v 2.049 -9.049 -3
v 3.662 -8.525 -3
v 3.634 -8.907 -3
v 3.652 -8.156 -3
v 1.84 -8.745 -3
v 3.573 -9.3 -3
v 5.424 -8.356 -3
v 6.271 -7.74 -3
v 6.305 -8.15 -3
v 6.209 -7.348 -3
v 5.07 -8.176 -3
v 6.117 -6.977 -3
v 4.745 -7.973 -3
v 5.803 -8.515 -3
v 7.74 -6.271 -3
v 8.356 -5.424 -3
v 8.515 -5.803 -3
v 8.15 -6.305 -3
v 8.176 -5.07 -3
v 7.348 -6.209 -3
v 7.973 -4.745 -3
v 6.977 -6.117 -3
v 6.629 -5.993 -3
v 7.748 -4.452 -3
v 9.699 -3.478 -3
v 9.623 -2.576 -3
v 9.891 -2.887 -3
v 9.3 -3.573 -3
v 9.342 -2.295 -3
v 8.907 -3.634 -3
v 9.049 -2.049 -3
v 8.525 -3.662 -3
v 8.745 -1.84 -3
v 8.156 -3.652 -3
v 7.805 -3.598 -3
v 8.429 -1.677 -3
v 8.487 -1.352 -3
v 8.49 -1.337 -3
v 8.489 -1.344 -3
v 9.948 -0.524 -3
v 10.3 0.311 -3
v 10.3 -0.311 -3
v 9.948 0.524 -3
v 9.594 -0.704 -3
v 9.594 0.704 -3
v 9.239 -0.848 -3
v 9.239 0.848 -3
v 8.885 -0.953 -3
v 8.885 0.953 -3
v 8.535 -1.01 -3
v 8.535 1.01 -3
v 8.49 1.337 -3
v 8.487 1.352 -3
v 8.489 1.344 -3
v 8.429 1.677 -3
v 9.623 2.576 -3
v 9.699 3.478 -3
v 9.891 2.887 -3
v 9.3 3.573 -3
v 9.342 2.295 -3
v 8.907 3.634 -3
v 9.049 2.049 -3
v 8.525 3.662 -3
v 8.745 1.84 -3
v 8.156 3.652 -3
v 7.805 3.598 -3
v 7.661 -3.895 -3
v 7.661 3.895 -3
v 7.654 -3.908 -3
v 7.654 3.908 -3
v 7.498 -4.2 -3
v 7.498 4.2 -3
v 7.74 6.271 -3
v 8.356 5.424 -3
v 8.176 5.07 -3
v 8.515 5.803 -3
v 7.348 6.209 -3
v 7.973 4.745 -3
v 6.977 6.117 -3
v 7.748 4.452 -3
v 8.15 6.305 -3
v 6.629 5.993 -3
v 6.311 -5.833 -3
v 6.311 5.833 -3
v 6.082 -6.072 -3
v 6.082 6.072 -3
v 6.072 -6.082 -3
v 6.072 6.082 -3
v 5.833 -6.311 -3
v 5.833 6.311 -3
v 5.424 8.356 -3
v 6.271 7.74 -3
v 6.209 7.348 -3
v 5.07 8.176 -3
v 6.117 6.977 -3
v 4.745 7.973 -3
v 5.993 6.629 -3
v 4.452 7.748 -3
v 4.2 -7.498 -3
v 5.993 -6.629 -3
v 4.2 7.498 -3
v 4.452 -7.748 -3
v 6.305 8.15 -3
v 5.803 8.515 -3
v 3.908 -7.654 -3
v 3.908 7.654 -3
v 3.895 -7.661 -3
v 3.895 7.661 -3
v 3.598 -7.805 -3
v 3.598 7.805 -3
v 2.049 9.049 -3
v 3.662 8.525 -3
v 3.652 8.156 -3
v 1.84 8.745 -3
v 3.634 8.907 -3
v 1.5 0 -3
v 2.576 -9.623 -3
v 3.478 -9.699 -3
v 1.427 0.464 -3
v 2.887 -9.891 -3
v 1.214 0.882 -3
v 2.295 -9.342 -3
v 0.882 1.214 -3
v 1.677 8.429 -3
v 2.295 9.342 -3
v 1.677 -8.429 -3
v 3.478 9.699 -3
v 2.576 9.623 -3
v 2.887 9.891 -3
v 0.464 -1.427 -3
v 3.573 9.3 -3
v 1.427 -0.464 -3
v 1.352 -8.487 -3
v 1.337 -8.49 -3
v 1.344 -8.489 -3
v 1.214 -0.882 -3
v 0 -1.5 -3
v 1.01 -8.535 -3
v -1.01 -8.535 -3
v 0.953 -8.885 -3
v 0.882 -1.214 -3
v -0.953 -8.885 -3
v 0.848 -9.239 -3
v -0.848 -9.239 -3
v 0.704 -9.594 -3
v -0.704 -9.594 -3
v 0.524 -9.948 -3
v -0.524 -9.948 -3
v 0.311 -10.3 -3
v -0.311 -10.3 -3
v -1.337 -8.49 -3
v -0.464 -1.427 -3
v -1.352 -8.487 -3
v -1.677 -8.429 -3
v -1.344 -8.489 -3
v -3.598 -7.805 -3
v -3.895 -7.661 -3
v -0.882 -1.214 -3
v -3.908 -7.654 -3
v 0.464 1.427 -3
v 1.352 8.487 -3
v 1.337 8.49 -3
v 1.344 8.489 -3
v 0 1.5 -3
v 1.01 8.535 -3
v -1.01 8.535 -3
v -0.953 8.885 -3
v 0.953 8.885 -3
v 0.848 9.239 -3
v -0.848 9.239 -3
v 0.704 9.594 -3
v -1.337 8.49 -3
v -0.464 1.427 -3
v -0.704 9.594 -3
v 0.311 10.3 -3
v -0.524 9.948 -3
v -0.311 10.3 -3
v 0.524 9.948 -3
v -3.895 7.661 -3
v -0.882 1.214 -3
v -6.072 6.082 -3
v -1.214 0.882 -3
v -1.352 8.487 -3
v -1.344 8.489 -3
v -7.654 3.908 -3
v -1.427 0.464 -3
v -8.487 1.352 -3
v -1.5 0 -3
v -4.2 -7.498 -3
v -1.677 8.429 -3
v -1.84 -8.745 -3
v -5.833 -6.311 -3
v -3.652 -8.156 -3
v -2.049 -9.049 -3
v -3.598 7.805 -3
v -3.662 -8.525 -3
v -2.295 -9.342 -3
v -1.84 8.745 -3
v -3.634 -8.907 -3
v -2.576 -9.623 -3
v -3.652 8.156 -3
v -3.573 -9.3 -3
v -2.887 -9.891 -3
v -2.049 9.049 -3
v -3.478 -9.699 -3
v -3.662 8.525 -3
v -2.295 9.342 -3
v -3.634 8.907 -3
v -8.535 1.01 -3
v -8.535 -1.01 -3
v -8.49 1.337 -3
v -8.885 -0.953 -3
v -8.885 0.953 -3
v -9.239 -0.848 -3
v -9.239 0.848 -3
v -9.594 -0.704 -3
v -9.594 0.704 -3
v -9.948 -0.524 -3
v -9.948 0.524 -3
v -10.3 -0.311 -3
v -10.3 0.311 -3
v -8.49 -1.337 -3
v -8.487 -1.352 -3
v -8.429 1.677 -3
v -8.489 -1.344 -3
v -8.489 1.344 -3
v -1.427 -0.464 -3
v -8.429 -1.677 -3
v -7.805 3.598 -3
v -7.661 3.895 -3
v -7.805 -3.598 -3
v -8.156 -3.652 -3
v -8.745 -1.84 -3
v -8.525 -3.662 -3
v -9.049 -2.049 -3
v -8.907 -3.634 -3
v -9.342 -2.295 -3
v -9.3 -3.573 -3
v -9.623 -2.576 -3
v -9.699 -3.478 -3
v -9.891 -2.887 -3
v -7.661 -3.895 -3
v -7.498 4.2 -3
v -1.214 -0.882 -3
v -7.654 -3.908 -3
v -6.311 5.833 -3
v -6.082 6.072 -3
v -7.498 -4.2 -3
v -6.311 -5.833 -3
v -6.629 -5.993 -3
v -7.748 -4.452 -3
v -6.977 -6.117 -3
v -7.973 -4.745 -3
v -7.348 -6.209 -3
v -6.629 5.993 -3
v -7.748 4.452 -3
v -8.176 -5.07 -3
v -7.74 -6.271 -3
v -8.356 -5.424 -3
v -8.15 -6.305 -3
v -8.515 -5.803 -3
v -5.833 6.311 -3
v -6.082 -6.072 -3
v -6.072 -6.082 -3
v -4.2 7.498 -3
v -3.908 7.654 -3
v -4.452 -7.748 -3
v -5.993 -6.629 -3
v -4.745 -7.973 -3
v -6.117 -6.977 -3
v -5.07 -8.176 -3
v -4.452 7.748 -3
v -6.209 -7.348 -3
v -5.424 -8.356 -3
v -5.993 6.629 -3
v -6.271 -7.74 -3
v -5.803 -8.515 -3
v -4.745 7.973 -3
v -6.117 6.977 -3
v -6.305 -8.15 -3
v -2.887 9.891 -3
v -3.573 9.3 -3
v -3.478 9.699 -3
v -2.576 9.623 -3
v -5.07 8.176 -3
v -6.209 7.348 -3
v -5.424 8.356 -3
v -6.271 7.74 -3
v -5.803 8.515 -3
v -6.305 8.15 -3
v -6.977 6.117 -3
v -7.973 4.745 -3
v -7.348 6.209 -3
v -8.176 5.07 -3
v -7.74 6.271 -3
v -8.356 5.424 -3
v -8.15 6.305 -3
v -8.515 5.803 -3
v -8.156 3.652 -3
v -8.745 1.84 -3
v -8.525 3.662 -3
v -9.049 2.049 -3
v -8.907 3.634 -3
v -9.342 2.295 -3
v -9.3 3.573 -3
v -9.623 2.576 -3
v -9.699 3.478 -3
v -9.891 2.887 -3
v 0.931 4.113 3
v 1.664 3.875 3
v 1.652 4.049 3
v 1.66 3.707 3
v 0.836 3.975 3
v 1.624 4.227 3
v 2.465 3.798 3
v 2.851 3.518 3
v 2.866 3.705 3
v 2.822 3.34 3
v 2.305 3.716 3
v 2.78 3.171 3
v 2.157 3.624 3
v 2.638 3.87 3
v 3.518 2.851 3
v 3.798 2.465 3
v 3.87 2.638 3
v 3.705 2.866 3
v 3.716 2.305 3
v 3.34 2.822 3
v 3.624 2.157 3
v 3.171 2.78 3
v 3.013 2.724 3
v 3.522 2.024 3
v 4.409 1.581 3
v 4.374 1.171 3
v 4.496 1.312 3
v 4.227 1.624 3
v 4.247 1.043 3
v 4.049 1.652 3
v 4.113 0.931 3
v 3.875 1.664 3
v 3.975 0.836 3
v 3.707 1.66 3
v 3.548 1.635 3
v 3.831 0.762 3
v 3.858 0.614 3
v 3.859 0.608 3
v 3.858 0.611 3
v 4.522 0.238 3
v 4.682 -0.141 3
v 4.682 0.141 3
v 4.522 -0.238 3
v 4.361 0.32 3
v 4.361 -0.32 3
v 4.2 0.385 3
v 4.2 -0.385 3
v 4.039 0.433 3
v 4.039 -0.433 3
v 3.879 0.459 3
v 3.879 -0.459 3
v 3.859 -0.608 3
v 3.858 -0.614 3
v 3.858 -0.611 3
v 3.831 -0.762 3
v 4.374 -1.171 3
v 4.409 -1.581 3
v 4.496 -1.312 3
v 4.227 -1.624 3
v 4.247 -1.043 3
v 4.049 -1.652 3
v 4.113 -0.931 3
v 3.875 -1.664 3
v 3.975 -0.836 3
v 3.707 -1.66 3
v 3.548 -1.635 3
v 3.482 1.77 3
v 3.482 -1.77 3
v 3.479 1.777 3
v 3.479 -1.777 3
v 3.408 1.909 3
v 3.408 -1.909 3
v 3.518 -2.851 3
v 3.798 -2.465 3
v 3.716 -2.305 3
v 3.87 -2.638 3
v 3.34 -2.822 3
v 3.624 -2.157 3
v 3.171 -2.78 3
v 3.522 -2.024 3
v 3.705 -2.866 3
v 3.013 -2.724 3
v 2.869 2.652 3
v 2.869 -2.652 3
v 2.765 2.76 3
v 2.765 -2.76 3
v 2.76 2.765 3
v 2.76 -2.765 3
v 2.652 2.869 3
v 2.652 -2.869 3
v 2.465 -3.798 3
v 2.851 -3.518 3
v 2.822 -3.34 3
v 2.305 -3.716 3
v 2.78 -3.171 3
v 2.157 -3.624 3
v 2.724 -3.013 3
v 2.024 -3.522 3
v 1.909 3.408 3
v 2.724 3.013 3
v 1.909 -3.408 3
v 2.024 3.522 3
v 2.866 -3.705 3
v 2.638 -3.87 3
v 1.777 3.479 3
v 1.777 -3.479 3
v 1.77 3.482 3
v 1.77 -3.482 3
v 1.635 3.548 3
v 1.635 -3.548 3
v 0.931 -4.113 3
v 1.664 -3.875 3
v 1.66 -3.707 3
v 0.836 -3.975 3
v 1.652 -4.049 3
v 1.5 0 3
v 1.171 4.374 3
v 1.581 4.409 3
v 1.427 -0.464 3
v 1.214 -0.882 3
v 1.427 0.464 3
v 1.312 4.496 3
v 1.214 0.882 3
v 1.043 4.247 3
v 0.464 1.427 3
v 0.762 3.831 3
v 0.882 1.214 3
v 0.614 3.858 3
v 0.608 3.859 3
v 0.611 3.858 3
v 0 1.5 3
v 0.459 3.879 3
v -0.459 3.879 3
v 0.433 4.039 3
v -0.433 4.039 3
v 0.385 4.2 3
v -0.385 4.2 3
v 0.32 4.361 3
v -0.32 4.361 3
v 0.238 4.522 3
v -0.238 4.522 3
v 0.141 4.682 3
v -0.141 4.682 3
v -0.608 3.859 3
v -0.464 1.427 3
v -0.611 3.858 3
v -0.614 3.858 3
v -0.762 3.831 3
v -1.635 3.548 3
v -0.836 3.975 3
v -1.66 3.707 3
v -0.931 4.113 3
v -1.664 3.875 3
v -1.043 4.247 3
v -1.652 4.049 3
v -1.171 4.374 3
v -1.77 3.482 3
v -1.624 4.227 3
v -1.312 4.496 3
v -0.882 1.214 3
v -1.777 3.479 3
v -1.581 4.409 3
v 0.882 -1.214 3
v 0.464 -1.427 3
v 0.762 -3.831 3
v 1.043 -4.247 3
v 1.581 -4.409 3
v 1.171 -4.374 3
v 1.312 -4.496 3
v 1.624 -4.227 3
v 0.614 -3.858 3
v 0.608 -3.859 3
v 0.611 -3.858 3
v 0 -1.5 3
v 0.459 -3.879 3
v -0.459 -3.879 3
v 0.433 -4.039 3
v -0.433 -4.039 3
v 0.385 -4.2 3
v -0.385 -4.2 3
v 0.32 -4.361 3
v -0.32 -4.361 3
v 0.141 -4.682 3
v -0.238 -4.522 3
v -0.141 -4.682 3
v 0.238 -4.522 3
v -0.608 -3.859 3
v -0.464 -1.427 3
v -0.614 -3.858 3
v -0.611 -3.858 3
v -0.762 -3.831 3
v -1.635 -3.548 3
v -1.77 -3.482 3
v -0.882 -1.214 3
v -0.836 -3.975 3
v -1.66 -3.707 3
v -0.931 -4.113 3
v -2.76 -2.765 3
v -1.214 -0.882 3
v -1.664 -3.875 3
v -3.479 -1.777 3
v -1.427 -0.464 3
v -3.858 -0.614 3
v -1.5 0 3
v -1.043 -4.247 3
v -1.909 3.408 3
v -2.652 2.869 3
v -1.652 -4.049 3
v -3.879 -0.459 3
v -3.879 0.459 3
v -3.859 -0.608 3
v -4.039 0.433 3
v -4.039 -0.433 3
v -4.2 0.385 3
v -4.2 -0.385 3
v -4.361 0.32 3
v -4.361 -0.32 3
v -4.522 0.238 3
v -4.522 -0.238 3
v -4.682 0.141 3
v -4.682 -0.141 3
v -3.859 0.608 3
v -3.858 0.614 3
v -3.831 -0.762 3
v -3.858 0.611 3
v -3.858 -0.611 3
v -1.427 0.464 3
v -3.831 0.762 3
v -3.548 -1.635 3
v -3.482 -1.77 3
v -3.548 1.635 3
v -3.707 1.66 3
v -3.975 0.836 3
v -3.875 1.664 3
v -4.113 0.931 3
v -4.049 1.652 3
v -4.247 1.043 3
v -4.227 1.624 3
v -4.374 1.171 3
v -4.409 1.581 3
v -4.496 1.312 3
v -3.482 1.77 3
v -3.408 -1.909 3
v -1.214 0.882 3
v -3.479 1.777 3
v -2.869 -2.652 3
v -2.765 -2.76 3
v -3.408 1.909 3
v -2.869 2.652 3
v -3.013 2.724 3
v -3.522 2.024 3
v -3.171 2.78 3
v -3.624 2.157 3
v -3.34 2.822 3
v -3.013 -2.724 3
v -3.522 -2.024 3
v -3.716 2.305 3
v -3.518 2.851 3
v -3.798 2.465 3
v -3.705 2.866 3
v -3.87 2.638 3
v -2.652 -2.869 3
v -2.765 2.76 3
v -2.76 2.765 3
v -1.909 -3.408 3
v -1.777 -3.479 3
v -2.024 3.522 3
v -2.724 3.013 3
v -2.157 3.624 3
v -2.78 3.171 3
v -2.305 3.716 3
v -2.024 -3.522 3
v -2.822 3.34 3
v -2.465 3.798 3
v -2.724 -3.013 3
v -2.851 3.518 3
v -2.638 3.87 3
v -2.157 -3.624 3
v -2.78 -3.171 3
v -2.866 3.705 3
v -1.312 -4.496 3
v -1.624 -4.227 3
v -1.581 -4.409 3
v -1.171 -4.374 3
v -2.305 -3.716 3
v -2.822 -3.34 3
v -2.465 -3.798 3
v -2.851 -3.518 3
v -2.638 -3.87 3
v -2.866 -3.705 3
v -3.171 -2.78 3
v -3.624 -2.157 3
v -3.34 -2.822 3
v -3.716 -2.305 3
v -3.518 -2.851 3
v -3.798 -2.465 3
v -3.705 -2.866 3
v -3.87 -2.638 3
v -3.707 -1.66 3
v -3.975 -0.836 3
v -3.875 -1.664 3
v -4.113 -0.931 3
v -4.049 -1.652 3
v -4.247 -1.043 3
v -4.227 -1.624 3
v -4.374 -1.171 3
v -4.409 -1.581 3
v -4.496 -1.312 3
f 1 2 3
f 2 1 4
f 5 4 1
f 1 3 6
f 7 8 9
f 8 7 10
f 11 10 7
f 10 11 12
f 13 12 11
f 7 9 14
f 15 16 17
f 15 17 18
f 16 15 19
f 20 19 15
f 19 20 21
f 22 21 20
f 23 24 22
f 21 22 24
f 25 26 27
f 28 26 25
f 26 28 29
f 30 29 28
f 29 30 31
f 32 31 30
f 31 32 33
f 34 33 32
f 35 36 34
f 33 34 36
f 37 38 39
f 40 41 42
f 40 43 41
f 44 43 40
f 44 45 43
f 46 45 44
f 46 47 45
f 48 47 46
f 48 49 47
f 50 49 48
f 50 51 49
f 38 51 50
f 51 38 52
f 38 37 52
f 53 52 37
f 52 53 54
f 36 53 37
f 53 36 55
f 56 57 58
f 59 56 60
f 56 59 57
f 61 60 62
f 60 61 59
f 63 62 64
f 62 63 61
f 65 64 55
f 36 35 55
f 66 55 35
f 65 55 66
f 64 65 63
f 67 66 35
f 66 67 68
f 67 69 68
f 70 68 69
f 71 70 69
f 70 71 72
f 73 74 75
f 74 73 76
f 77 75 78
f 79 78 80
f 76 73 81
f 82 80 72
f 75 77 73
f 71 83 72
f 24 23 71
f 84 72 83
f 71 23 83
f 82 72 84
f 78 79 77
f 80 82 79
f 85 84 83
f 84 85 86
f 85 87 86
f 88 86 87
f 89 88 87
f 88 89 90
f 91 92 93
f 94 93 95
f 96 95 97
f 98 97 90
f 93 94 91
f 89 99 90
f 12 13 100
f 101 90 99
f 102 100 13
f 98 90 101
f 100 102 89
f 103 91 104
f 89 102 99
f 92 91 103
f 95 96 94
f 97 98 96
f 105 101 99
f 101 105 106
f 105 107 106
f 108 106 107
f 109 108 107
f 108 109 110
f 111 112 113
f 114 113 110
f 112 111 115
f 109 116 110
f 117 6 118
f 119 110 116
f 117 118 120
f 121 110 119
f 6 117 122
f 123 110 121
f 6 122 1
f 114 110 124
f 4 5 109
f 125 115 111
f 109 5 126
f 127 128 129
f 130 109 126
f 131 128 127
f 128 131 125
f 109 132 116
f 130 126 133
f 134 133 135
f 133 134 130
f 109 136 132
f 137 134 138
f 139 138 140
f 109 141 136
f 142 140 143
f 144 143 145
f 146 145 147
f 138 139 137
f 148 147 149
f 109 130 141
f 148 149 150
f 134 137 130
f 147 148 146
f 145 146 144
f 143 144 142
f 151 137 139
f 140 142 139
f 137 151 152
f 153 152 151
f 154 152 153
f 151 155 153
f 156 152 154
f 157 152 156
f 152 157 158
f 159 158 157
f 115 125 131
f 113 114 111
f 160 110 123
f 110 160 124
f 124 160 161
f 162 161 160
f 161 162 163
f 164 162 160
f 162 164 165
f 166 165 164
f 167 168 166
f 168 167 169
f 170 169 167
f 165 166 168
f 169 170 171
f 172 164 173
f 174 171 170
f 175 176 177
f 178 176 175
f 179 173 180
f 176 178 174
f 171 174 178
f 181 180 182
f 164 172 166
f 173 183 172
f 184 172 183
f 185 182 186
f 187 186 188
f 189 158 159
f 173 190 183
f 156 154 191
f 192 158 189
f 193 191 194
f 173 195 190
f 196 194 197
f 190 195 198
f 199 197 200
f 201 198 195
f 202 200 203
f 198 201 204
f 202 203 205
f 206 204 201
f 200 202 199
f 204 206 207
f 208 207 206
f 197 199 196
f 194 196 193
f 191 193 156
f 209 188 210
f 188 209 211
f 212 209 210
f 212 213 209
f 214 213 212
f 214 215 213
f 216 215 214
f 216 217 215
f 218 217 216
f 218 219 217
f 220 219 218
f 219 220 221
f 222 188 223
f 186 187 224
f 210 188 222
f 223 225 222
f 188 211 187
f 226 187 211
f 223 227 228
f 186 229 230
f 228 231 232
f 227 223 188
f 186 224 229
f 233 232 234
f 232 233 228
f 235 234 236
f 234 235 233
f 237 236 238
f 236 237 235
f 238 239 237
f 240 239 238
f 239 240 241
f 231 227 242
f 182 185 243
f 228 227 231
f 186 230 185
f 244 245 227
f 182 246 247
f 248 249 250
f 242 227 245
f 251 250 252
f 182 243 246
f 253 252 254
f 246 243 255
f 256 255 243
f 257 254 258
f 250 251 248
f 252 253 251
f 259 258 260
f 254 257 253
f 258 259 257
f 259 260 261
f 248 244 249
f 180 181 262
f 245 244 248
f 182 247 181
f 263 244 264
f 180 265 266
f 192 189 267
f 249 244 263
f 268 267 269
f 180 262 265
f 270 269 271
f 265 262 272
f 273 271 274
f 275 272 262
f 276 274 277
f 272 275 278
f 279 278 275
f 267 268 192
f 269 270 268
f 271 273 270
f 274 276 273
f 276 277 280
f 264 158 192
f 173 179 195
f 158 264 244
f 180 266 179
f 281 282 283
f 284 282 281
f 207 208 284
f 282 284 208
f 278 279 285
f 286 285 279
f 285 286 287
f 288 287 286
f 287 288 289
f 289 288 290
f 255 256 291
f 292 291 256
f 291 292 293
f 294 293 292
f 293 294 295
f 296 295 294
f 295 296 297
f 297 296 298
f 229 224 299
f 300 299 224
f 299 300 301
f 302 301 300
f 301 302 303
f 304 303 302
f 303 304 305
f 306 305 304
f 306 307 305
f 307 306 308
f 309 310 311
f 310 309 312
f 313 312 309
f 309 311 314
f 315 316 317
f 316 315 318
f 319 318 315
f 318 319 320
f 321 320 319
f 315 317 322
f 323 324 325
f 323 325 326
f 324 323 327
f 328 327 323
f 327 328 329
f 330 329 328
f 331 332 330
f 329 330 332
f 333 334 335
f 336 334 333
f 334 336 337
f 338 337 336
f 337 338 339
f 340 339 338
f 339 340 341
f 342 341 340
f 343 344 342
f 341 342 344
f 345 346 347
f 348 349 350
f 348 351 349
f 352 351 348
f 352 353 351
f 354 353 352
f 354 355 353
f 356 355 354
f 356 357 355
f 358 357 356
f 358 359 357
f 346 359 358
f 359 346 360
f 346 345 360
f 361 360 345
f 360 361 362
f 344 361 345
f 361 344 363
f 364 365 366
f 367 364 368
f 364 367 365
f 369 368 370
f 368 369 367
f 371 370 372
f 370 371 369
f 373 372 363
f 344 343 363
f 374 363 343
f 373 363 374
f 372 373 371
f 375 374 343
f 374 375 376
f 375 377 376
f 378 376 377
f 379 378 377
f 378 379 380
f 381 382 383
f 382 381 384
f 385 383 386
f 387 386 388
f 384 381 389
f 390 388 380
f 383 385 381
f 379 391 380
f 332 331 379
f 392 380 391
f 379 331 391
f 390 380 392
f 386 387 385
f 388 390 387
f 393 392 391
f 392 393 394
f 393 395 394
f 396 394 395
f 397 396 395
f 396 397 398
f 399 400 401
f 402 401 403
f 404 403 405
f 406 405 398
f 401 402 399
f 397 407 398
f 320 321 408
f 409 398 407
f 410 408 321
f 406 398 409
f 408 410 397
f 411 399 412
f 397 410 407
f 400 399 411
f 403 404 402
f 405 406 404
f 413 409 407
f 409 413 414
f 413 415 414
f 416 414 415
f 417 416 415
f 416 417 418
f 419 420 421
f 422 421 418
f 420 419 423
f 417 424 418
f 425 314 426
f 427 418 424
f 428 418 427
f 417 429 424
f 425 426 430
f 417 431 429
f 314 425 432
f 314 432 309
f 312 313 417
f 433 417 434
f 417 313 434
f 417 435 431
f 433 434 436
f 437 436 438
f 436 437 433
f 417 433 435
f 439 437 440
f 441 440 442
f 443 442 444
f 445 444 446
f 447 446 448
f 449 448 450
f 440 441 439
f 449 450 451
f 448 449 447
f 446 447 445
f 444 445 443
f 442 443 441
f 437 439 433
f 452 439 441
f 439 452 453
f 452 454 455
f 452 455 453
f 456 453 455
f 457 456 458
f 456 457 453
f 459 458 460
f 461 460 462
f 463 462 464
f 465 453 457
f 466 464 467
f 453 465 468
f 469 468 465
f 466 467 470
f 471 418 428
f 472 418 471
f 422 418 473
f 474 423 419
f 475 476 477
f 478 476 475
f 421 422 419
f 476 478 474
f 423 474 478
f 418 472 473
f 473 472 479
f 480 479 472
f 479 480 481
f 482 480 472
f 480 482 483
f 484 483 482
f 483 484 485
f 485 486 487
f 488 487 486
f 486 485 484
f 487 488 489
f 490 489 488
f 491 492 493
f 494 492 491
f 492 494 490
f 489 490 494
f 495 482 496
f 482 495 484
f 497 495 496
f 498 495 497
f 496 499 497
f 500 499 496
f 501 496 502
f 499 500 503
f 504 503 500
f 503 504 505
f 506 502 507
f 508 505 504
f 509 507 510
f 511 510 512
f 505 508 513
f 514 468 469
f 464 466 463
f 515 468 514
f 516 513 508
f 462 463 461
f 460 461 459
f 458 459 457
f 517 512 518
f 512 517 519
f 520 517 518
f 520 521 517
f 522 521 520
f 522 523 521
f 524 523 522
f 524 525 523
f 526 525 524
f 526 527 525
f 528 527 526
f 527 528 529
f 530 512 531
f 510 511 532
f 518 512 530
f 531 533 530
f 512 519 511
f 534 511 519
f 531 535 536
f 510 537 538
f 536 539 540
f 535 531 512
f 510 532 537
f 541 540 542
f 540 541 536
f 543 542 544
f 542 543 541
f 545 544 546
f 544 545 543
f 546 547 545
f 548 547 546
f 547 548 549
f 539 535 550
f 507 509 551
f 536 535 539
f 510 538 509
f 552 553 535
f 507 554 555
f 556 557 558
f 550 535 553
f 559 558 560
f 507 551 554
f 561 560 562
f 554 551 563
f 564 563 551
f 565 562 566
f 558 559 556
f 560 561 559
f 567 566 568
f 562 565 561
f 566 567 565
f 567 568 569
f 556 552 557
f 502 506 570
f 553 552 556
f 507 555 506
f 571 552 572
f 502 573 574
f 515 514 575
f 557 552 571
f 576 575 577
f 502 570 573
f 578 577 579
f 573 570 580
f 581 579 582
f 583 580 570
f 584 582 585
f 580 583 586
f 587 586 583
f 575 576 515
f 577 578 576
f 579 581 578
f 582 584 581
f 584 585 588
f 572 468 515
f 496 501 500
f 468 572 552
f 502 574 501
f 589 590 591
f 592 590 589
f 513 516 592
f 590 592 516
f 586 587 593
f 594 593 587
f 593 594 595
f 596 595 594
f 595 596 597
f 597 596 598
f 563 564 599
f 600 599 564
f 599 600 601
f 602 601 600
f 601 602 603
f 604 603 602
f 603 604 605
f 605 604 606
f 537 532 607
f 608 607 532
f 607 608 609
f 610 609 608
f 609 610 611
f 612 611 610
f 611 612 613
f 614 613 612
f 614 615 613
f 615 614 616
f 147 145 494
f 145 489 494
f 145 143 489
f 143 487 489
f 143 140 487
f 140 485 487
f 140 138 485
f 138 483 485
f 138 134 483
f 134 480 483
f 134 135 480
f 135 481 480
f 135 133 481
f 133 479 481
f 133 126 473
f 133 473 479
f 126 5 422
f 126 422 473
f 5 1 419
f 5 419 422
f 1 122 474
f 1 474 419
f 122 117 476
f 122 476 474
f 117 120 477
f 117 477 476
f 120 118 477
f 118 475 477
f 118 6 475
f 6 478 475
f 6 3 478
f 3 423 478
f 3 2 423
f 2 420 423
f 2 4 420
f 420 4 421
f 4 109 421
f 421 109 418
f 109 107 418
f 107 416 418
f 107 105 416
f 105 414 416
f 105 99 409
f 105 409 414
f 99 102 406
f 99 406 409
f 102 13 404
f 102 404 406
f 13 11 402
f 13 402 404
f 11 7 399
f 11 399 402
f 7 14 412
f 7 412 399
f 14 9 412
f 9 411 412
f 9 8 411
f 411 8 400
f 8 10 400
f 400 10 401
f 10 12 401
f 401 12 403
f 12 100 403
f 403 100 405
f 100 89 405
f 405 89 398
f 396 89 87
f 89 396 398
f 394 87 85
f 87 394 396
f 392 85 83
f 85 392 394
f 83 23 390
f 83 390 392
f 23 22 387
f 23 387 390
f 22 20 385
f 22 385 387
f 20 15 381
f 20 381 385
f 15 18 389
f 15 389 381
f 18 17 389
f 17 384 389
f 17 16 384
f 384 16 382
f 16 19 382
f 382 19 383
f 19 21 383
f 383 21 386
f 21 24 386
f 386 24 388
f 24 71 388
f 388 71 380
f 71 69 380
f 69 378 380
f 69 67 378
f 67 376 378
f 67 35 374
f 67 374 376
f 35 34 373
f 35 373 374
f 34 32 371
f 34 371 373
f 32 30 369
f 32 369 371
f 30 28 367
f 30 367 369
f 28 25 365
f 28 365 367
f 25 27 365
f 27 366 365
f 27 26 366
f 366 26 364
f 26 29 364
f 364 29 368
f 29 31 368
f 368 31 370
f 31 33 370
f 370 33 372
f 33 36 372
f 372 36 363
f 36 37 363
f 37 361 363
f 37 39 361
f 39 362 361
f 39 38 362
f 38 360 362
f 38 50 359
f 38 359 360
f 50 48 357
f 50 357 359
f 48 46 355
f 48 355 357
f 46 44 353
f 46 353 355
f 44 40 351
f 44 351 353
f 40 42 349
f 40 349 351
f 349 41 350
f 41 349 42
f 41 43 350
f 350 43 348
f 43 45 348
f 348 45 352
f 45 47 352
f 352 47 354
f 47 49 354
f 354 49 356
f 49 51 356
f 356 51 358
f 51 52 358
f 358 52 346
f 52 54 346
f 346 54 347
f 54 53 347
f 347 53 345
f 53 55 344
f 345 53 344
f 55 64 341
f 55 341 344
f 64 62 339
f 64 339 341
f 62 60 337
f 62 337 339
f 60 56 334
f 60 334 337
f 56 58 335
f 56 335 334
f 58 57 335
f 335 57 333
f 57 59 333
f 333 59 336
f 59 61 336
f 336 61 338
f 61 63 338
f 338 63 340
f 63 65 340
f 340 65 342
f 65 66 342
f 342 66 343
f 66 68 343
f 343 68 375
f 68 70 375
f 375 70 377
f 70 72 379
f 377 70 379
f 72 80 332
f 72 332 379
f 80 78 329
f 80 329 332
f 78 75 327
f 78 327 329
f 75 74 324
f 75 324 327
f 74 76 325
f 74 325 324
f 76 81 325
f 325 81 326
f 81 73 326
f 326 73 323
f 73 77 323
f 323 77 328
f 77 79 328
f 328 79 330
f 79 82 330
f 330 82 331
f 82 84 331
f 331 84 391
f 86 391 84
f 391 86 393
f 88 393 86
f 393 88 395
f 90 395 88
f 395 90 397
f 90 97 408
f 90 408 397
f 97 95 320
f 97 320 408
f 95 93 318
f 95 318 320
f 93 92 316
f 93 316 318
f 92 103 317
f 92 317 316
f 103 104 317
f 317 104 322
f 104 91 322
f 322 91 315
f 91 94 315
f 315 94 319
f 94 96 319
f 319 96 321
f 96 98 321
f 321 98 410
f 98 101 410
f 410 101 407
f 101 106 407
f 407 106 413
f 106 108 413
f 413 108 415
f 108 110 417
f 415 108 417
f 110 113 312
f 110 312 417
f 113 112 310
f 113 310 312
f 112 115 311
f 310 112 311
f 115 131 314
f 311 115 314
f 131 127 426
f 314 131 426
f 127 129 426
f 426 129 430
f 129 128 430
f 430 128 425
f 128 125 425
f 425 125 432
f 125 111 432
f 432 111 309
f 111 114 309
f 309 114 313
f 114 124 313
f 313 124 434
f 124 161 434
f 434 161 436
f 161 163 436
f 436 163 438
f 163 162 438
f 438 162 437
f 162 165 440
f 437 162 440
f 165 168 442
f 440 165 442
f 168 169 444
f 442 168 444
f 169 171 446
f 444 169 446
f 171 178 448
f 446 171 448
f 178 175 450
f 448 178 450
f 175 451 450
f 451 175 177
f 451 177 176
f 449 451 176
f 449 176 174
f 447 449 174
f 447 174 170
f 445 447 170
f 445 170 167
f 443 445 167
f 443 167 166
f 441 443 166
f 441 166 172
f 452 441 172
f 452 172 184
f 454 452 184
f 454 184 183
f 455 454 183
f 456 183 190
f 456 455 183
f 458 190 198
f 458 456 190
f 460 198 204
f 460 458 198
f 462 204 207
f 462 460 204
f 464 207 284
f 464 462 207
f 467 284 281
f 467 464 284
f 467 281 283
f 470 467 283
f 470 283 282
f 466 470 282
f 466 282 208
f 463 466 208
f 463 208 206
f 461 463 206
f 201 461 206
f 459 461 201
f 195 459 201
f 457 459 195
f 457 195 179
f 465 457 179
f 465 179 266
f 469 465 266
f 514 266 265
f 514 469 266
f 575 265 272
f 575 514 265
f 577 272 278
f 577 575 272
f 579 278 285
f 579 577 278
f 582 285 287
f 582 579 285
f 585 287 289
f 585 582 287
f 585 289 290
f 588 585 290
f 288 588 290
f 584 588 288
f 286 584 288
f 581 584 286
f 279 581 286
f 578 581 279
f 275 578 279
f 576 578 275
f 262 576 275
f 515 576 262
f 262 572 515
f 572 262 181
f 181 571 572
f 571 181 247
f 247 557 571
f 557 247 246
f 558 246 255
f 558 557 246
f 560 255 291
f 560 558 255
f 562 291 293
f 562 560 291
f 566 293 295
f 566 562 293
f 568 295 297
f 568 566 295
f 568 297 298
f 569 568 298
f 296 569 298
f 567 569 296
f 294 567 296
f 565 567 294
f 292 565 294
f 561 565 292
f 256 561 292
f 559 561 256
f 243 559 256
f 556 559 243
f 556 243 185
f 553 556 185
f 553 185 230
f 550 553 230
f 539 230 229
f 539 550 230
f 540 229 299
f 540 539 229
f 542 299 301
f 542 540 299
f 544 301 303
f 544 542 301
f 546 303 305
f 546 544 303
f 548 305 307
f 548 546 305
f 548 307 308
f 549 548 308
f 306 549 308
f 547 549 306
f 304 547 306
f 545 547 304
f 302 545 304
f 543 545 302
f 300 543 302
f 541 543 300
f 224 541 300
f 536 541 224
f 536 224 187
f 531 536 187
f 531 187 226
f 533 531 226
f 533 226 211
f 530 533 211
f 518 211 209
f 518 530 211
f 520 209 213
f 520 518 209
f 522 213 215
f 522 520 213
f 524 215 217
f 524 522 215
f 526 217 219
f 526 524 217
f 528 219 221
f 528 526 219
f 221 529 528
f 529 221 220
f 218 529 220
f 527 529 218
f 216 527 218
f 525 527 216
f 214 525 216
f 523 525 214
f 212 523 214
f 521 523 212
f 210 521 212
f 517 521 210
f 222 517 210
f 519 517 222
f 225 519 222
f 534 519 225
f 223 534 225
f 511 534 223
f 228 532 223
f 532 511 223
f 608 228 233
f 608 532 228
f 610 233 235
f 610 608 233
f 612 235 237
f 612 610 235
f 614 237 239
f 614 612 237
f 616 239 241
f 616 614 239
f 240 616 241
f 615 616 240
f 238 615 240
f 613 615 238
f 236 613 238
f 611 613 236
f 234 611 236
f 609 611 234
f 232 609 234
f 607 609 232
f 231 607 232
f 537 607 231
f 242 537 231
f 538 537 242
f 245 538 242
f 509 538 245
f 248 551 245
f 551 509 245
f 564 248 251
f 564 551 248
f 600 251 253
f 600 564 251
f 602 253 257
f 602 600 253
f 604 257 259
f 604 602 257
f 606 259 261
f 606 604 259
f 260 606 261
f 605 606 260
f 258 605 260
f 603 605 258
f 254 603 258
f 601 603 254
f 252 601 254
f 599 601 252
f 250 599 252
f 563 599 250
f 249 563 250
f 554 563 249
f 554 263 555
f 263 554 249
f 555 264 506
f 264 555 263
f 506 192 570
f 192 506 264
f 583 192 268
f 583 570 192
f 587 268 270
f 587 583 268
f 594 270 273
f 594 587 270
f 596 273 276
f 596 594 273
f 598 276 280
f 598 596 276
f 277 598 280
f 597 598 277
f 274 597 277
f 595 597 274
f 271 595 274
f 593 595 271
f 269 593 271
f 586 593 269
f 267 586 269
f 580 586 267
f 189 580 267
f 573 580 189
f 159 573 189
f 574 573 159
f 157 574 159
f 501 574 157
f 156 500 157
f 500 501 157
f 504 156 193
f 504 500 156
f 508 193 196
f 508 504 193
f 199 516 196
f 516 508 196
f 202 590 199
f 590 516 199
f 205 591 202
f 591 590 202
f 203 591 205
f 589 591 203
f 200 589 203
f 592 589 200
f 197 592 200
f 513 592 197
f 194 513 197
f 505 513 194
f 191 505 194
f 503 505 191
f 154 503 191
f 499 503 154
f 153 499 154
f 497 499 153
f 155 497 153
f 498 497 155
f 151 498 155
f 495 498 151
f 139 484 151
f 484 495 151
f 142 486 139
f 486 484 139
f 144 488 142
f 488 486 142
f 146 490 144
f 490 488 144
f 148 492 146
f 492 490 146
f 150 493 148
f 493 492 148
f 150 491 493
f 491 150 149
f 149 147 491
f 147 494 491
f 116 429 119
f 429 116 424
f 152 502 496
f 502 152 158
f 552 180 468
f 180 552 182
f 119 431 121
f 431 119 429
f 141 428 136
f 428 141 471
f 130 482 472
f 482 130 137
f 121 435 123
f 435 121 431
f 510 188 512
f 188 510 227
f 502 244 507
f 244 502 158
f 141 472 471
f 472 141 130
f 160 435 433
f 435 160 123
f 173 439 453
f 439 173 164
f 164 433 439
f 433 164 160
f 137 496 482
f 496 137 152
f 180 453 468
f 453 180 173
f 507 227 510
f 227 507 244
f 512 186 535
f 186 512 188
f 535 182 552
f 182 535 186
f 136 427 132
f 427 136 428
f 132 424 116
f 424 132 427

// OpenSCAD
//////////////////////////////////////////////////////////////////////////////////////////////
// Public Domain Parametric Involute Spur Gear (and involute helical gear and involute rack)
// version 1.1
// by Leemon Baird, 2011, Leemon@Leemon.com
//http://www.thingiverse.com/thing:5505
//
// This file is public domain.  Use it for any purpose, including commercial
// applications.  Attribution would be nice, but is not required.  There is
// no warranty of any kind, including its correctness, usefulness, or safety.
// 
// This is parameterized involute spur (or helical) gear.  It is much simpler and less powerful than
// others on Thingiverse.  But it is public domain.  I implemented it from scratch from the 
// descriptions and equations on Wikipedia and the web, using Mathematica for calculations and testing,
// and I now release it into the public domain.
//
//		http://en.wikipedia.org/wiki/Involute_gear
//		http://en.wikipedia.org/wiki/Gear
//		http://en.wikipedia.org/wiki/List_of_gear_nomenclature
//		http://gtrebaol.free.fr/doc/catia/spur_gear.html
//		http://www.cs.cmu.edu/~rapidproto/mechanisms/chpt7.html
//
// The module gear() gives an involute spur gear, with reasonable defaults for all the parameters.
// Normally, you should just choose the first 4 parameters, and let the rest be default values.
// The module gear() gives a gear in the XY plane, centered on the origin, with one tooth centered on
// the positive Y axis.  The various functions below it take the same parameters, and return various
// measurements for the gear.  The most important is pitch_radius, which tells how far apart to space
// gears that are meshing, and adendum_radius, which gives the size of the region filled by the gear.
// A gear has a "pitch circle", which is an invisible circle that cuts through the middle of each
// tooth (though not the exact center). In order for two gears to mesh, their pitch circles should 
// just touch.  So the distance between their centers should be pitch_radius() for one, plus pitch_radius() 
// for the other, which gives the radii of their pitch circles.
//
// In order for two gears to mesh, they must have the same mm_per_tooth and pressure_angle parameters.  
// mm_per_tooth gives the number of millimeters of arc around the pitch circle covered by one tooth and one
// space between teeth.  The pitch angle controls how flat or bulged the sides of the teeth are.  Common
// values include 14.5 degrees and 20 degrees, and occasionally 25.  Though I've seen 28 recommended for
// plastic gears. Larger numbers bulge out more, giving stronger teeth, so 28 degrees is the default here.
//
// The ratio of number_of_teeth for two meshing gears gives how many times one will make a full 
// revolution when the the other makes one full revolution.  If the two numbers are coprime (i.e. 
// are not both divisible by the same number greater than 1), then every tooth on one gear
// will meet every tooth on the other, for more even wear.  So coprime numbers of teeth are good.
//
// The module rack() gives a rack, which is a bar with teeth.  A rack can mesh with any
// gear that has the same mm_per_tooth and pressure_angle.
//
// Some terminology: 
// The outline of a gear is a smooth circle (the "pitch circle") which has mountains and valleys
// added so it is toothed.  So there is an inner circle (the "root circle") that touches the 
// base of all the teeth, an outer circle that touches the tips of all the teeth,
// and the invisible pitch circle in between them.  There is also a "base circle", which can be smaller than
// all three of the others, which controls the shape of the teeth.  The side of each tooth lies on the path 
// that the end of a string would follow if it were wrapped tightly around the base circle, then slowly unwound.  
// That shape is an "involute", which gives this type of gear its name.
//
//////////////////////////////////////////////////////////////////////////////////////////////

//An involute spur gear, with reasonable defaults for all the parameters.
//Normally, you should just choose the first 4 parameters, and let the rest be default values.
//Meshing gears must match in mm_per_tooth, pressure_angle, and twist,
//and be separated by the sum of their pitch radii, which can be found with pitch_radius().
module gear (
	mm_per_tooth    = 3,    //this is the "circular pitch", the circumference of the pitch circle divided by the number of teeth
	number_of_teeth = 11,   //total number of teeth around the entire perimeter
	thickness       = 6,    //thickness of gear in mm
	hole_diameter   = 3,    //diameter of the hole in the center, in mm
	twist           = 0,    //teeth rotate this many degrees from bottom of gear to top.  360 makes the gear a screw with each thread going around once
	teeth_to_hide   = 0,    //number of teeth to delete to make this only a fraction of a circle
	pressure_angle  = 28,   //Controls how straight or bulged the tooth sides are. In degrees.
	clearance       = 0.0,  //gap between top of a tooth on one gear and bottom of valley on a meshing gear (in millimeters)
	backlash        = 0.0   //gap between two meshing teeth, in the direction along the circumference of the pitch circle
) {
	pi = 3.1415926;
	p  = mm_per_tooth * number_of_teeth / pi / 2;  //radius of pitch circle
	c  = p + mm_per_tooth / pi - clearance;        //radius of outer circle
	b  = p*cos(pressure_angle);                    //radius of base circle
	r  = p-(c-p)-clearance;                        //radius of root circle
	t  = mm_per_tooth/2-backlash/2;                //tooth thickness at pitch circle
	k  = -iang(b, p) - t/2/p/pi*180; {             //angle to where involute meets base circle on each side of tooth
		difference() {
			for (i = [0:number_of_teeth-teeth_to_hide-1] )
				rotate([0,0,i*360/number_of_teeth])
					linear_extrude(height = thickness, center = true, convexity = 10, twist = twist)
						polygon(
							points=[
								[0, -hole_diameter/10],
								polar(r, -181/number_of_teeth),
								polar(r, r<b ? k : -180/number_of_teeth),
								q7(0/5,r,b,c,k, 1),q7(1/5,r,b,c,k, 1),q7(2/5,r,b,c,k, 1),q7(3/5,r,b,c,k, 1),q7(4/5,r,b,c,k, 1),q7(5/5,r,b,c,k, 1),
								q7(5/5,r,b,c,k,-1),q7(4/5,r,b,c,k,-1),q7(3/5,r,b,c,k,-1),q7(2/5,r,b,c,k,-1),q7(1/5,r,b,c,k,-1),q7(0/5,r,b,c,k,-1),
								polar(r, r<b ? -k : 180/number_of_teeth),
								polar(r, 181/number_of_teeth)
							],
 							paths=[[0,1,2,3,4,5,6,7,8,9,10,11,12,13,14,15,16]]
						);
			cylinder(h=2*thickness+1, r=hole_diameter/2, center=true, $fn=20);
		}
	}
};	
//these 4 functions are used by gear
function polar(r,theta)   = r*[sin(theta), cos(theta)];                            //convert polar to cartesian coordinates
function iang(r1,r2)      = sqrt((r2/r1)*(r2/r1) - 1)/3.1415926*180 - acos(r1/r2); //unwind a string this many degrees to go from radius r1 to radius r2
function q7(f,r,b,r2,t,s) = q6(b,s,t,(1-f)*max(b,r)+f*r2);                         //radius a fraction f up the curved side of the tooth 
function q6(b,s,t,d)      = polar(d,s*(iang(b,d)+t));                              //point at radius d on the involute curve

//a rack, which is a straight line with teeth (the same as a segment from a giant gear with a huge number of teeth).
//The "pitch circle" is a line along the X axis.
module rack (
	mm_per_tooth    = 3,    //this is the "circular pitch", the circumference of the pitch circle divided by the number of teeth
	number_of_teeth = 11,   //total number of teeth along the rack
	thickness       = 6,    //thickness of rack in mm (affects each tooth)
	height          = 120,   //height of rack in mm, from tooth top to far side of rack.
	pressure_angle  = 28,   //Controls how straight or bulged the tooth sides are. In degrees.
	backlash        = 0.0   //gap between two meshing teeth, in the direction along the circumference of the pitch circle
) {
	assign(pi = 3.1415926)
	assign(a = mm_per_tooth / pi) //addendum
	assign(t = a*cos(pressure_angle)-1)         //tooth side is tilted so top/bottom corners move this amount
		for (i = [0:number_of_teeth-1] )
			translate([i*mm_per_tooth,0,0])
				linear_extrude(height = thickness, center = true, convexity = 10)
					polygon(
						points=[
							[-mm_per_tooth * 3/4,                 a-height],
							[-mm_per_tooth * 3/4 - backlash,     -a],
							[-mm_per_tooth * 1/4 + backlash - t, -a],
							[-mm_per_tooth * 1/4 + backlash + t,  a],
							[ mm_per_tooth * 1/4 - backlash - t,  a],
							[ mm_per_tooth * 1/4 - backlash + t, -a],
							[ mm_per_tooth * 3/4 + backlash,     -a],
							[ mm_per_tooth * 3/4,                 a-height],
						],
						paths=[[0,1,2,3,4,5,6,7]]
					);
};	

//These 5 functions let the user find the derived dimensions of the gear.
//A gear fits within a circle of radius outer_radius, and two gears should have
//their centers separated by the sum of their pictch_radius.
function circular_pitch  (mm_per_tooth=3) = mm_per_tooth;                     //tooth density expressed as "circular pitch" in millimeters
function diametral_pitch (mm_per_tooth=3) = 3.1415926 / mm_per_tooth;         //tooth density expressed as "diametral pitch" in teeth per millimeter
function module_value    (mm_per_tooth=3) = mm_per_tooth / pi;                //tooth density expressed as "module" or "modulus" in millimeters
function pitch_radius    (mm_per_tooth=3,number_of_teeth=11) = mm_per_tooth * number_of_teeth / 3.1415926 / 2;
function outer_radius    (mm_per_tooth=3,number_of_teeth=11,clearance=0.1)    //The gear fits entirely within a cylinder of this radius.
	= mm_per_tooth*(1+number_of_teeth/2)/3.1415926  - clearance;              
//////////////////////////////////////////////////////////////

//An involute spur gear, with reasonable defaults for all the parameters.
//Normally, you should just choose the first 4 parameters, and let the rest be default values.
//Meshing gears must match in mm_per_tooth, pressure_angle, and twist,
//and be separated by the sum of their pitch radii, which can be found with pitch_radius().
module angled_gear (
	mm_per_tooth    = 3,    //this is the "circular pitch", the circumference of the pitch circle divided by the number of teeth
	number_of_teeth = 11,   //total number of teeth around the entire perimeter
	thickness       = 6,    //thickness of gear in mm
	hole_diameter   = 3,    //diameter of the hole in the center, in mm
    cone_height    = 11,   // height of the cone in mm
	twist           = 0,    //teeth rotate this many degrees from bottom of gear to top.  360 makes the gear a screw with each thread going around once
	teeth_to_hide   = 0,    //number of teeth to delete to make this only a fraction of a circle
	pressure_angle  = 28,   //Controls how straight or bulged the tooth sides are. In degrees.
	clearance       = 0.0,  //gap between top of a tooth on one gear and bottom of valley on a meshing gear (in millimeters)
	backlash        = 0.0   //gap between two meshing teeth, in the direction along the circumference of the pitch circle
) {
	pi = 3.1415926;
	p  = mm_per_tooth * number_of_teeth / pi / 2;  //radius of pitch circle
	c  = p + mm_per_tooth / pi - clearance;        //radius of outer circle
	b  = p*cos(pressure_angle);                    //radius of base circle
	r  = p-(c-p)-clearance;                        //radius of root circle
	t  = mm_per_tooth/2-backlash/2;                //tooth thickness at pitch circle
	k  = -iang(b, p) - t/2/p/pi*180;             //angle to where involute meets base circle on each side of tooth
    w = (cone_height-thickness)/cone_height;
    
    difference() {
        linear_extrude(height = thickness, center = true, convexity = 10, twist = twist, scale=w)
            for (i = [0:number_of_teeth-teeth_to_hide-1] )
                rotate([0,0,i*360/number_of_teeth])
                    polygon(
                        points=[
                            [0, -hole_diameter/10],
                            polar(r, -181/number_of_teeth),
                            polar(r, r<b ? k : -180/number_of_teeth),
                            q7(0/5,r,b,c,k, 1),q7(1/5,r,b,c,k, 1),q7(2/5,r,b,c,k, 1),q7(3/5,r,b,c,k, 1),q7(4/5,r,b,c,k, 1),q7(5/5,r,b,c,k, 1),
                            q7(5/5,r,b,c,k,-1),q7(4/5,r,b,c,k,-1),q7(3/5,r,b,c,k,-1),q7(2/5,r,b,c,k,-1),q7(1/5,r,b,c,k,-1),q7(0/5,r,b,c,k,-1),
                            polar(r, r<b ? -k : 180/number_of_teeth),
                            polar(r, 181/number_of_teeth)
                        ],
                        paths=[[0,1,2,3,4,5,6,7,8,9,10,11,12,13,14,15,16]]
                    );
        cylinder(h=2*thickness+1, r=hole_diameter/2, center=true, $fn=20);
    }
};	
//////////////////////////////////////////////////////////////////////////////////////////////
//example gear

angled_gear(mm_per_tooth=3, number_of_teeth=20, clearance=0.2, backlash=0.05);
